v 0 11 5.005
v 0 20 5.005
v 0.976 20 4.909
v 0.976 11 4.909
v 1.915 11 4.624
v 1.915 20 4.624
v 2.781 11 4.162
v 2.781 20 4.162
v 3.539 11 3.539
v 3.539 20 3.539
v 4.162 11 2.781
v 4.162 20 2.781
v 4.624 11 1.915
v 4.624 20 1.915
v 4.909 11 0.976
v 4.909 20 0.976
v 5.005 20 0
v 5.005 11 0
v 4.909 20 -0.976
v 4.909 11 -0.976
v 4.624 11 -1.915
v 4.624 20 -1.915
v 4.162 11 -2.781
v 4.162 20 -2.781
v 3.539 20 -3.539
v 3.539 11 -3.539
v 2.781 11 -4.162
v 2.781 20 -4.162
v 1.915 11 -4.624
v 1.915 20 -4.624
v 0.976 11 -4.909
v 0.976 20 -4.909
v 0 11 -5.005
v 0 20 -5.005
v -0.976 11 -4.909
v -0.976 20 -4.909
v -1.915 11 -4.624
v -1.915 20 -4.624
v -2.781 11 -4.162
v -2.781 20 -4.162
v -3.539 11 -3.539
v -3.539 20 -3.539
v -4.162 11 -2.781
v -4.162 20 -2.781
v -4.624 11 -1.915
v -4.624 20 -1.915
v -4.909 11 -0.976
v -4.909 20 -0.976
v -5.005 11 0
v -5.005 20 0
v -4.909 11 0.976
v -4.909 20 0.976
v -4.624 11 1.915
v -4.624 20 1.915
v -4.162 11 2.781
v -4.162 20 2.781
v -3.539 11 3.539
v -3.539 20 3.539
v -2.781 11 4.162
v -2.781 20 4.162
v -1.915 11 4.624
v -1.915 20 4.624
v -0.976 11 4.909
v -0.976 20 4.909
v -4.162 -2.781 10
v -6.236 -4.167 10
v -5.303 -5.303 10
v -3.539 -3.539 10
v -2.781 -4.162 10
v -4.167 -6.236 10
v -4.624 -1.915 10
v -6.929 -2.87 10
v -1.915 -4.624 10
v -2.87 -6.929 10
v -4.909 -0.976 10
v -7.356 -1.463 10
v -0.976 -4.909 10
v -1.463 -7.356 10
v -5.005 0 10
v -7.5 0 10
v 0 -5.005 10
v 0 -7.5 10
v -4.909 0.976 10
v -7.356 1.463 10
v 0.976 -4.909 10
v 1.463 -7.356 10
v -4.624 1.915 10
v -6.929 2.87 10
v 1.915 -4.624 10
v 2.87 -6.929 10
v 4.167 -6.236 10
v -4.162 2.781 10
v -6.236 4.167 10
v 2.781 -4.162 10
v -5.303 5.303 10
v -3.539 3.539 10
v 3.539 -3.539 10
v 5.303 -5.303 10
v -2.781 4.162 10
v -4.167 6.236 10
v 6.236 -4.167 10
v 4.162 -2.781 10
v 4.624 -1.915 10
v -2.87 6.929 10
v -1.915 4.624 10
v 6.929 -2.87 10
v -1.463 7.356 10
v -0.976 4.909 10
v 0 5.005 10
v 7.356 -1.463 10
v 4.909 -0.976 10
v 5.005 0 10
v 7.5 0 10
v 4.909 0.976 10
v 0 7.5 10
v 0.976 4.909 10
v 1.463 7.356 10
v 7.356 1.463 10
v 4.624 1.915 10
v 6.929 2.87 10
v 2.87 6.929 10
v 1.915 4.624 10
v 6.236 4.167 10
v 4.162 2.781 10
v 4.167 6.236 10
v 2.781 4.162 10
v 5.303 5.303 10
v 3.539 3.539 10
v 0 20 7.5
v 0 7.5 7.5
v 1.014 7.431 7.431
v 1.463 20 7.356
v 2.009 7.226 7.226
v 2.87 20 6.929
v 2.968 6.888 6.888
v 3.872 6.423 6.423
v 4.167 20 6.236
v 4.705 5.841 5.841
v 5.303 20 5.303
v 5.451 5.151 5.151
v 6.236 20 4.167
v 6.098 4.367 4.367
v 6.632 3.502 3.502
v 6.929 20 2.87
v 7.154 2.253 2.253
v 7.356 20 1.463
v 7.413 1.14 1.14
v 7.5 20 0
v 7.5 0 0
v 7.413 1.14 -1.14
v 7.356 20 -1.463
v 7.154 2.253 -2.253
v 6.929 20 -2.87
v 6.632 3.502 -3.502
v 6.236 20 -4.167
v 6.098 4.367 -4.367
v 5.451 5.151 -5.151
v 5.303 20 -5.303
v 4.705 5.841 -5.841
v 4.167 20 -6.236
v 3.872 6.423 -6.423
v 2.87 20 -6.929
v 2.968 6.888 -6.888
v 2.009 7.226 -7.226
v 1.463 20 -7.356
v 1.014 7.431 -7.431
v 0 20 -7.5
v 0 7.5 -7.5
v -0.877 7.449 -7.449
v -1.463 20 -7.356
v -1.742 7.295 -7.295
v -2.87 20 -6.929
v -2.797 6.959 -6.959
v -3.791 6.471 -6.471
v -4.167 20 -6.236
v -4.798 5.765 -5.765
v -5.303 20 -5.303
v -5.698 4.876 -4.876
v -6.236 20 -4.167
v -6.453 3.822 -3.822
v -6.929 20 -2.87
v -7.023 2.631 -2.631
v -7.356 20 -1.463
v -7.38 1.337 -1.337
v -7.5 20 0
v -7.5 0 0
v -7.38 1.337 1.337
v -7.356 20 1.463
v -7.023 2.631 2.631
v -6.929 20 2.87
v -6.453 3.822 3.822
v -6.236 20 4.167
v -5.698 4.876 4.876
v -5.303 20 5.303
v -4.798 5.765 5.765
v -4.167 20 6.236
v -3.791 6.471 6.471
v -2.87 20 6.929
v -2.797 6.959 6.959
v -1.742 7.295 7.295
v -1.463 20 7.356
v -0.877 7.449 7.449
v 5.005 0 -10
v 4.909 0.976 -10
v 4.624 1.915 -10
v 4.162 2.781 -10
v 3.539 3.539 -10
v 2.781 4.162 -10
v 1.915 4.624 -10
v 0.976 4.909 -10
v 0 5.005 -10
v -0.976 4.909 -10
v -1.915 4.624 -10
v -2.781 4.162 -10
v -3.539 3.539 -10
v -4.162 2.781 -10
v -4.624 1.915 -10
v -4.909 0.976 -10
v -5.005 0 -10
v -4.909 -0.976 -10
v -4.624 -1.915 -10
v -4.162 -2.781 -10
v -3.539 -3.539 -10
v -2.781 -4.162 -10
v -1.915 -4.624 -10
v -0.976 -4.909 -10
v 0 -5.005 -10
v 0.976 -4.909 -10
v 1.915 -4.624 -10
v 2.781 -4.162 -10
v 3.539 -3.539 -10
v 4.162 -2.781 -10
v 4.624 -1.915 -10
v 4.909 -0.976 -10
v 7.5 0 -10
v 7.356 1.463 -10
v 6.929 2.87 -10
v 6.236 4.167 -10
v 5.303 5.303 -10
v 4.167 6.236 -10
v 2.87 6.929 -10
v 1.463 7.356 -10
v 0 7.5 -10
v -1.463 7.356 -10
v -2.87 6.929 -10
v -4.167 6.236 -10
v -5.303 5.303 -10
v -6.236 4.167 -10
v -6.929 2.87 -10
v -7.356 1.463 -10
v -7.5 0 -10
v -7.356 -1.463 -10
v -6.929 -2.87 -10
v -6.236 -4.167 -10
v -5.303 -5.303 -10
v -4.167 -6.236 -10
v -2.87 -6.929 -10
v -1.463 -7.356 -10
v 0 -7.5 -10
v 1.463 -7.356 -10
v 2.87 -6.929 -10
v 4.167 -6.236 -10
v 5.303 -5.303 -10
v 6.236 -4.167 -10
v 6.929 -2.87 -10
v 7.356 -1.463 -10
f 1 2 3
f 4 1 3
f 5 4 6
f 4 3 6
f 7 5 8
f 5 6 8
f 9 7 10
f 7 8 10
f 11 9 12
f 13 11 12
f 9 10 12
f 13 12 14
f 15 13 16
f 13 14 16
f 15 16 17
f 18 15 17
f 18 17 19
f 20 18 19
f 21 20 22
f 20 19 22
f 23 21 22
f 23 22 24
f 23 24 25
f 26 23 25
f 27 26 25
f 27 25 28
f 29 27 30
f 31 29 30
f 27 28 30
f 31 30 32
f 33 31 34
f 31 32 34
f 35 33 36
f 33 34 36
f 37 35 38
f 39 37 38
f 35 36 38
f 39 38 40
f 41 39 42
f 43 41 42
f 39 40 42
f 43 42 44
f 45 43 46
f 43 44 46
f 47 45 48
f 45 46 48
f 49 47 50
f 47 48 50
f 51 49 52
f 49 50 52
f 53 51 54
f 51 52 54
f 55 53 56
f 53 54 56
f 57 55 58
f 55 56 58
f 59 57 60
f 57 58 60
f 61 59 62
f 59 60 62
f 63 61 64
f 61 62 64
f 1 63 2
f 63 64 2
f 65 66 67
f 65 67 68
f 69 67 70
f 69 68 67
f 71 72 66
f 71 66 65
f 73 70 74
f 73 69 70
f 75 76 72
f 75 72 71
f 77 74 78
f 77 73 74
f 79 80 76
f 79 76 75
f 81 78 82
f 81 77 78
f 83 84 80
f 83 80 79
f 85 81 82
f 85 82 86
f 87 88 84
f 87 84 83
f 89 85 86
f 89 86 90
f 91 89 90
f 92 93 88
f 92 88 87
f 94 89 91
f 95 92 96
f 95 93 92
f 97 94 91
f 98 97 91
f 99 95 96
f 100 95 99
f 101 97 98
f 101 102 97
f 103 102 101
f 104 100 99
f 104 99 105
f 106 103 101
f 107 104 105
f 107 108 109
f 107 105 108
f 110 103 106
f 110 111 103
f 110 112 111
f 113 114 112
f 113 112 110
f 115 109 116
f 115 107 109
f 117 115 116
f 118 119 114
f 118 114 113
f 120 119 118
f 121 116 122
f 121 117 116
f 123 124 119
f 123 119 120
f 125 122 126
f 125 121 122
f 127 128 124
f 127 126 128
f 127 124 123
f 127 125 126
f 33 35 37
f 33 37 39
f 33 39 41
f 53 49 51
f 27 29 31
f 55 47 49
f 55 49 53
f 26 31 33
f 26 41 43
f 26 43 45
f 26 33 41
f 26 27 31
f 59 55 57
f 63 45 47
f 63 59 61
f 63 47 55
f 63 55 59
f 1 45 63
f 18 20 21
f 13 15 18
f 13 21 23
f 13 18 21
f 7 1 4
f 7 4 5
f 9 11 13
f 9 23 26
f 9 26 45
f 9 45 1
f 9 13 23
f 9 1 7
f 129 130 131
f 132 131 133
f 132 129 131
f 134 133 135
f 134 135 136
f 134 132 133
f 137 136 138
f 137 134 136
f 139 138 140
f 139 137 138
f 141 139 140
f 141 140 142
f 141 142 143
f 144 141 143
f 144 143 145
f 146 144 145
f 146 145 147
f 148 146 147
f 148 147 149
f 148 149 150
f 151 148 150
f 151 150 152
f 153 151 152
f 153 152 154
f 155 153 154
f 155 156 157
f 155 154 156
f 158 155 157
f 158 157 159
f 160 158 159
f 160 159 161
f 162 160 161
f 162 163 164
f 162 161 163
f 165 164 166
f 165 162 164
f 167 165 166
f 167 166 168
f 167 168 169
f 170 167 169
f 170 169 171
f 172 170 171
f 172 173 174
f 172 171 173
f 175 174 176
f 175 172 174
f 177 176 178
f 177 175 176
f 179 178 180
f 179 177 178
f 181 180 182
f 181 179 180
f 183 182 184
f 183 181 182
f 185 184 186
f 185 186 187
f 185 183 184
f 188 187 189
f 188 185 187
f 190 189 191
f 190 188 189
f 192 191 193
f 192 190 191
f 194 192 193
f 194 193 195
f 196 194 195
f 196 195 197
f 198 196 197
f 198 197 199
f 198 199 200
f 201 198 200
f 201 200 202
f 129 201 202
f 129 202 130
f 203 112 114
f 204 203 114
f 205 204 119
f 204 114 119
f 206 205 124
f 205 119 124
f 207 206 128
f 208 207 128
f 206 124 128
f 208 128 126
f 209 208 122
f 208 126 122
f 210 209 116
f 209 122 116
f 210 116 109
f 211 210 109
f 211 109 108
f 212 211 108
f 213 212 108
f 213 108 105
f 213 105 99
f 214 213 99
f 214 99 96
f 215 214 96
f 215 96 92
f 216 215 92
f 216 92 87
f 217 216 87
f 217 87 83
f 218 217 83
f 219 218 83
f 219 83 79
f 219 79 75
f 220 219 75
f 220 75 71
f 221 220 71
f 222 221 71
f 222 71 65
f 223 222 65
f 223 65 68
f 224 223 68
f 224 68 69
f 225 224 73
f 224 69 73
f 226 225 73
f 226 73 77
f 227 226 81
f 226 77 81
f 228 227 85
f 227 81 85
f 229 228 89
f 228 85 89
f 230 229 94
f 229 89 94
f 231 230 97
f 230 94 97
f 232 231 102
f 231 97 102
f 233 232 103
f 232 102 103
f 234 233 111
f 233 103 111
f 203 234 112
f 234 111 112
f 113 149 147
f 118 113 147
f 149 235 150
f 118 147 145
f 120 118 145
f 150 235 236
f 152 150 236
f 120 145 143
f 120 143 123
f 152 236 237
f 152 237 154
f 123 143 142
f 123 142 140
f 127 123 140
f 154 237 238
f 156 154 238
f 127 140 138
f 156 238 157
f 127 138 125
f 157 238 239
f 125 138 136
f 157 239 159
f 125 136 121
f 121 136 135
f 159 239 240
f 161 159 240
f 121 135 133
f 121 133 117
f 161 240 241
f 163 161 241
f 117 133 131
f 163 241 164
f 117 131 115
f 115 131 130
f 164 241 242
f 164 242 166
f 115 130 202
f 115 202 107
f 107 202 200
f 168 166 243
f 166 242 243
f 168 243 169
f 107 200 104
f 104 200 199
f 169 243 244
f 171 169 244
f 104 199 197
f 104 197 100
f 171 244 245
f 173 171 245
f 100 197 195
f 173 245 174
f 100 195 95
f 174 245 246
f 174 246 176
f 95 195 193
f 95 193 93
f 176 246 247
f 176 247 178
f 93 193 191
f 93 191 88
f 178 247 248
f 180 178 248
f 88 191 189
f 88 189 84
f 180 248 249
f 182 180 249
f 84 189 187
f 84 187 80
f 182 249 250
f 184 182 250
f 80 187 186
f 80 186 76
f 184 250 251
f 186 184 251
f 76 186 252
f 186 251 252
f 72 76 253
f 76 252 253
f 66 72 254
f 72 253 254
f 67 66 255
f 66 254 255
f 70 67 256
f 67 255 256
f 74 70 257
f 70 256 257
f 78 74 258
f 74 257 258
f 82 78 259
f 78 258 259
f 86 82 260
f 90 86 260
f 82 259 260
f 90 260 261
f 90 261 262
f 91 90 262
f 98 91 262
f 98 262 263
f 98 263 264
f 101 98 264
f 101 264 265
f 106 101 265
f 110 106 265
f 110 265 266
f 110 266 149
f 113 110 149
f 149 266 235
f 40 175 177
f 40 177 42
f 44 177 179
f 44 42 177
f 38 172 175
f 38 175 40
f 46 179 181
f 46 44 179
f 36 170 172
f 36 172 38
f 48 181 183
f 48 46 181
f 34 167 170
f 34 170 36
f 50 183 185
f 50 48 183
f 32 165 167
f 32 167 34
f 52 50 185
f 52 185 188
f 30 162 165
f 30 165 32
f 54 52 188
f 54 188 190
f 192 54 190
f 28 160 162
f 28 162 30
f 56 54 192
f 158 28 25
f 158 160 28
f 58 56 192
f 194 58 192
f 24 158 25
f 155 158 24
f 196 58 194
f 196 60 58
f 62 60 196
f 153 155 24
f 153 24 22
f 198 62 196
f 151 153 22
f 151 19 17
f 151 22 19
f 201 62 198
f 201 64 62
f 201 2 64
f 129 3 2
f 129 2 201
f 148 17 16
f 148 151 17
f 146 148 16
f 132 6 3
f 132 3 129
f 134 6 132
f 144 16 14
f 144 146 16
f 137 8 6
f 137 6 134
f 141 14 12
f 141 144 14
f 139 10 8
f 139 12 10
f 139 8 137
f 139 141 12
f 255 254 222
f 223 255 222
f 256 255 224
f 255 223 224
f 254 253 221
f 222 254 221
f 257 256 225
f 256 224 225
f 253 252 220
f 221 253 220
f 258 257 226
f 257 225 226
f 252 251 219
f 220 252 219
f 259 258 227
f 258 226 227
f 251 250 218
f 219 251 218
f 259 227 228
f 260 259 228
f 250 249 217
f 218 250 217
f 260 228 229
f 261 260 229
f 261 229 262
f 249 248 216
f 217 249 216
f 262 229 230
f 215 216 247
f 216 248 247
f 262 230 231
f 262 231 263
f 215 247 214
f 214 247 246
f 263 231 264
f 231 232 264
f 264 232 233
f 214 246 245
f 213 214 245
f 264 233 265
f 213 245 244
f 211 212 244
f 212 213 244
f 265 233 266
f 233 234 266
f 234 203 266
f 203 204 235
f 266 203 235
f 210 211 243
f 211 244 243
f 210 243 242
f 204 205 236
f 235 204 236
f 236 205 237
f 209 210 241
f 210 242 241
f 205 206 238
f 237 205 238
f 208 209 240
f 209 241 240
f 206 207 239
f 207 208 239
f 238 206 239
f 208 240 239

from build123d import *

# Parameters (mm, degrees)
BOSS_EXTRUDE1_DEPTH      = 10
BOSS_EXTRUDE1_DEPTH_BACK = 10
SKETCH1_R                = 7.5
SKETCH3_R                = 7.5
BOSS_EXTRUDE2_DEPTH      = 20
SKETCH4_R                = 5.005
CUT_EXTRUDE2_DEPTH       = 23
SKETCH5_R                = 5.005
CUT_EXTRUDE3_DEPTH       = 9


with BuildPart() as part:
    # Sketch1 → Boss-Extrude1 (new, two sides: drawn at the far end of the back side and taken through both)
    with BuildSketch(Plane.XY.offset(-BOSS_EXTRUDE1_DEPTH_BACK)):
        Circle(SKETCH1_R)
    extrude(amount=BOSS_EXTRUDE1_DEPTH + BOSS_EXTRUDE1_DEPTH_BACK)

    # Sketch3 → Boss-Extrude2 (add)
    with BuildSketch(Plane(origin=(0, 20, 0), x_dir=(1, 0, 0), z_dir=(0, 1, 0))):
        Circle(SKETCH3_R)
    extrude(amount=-BOSS_EXTRUDE2_DEPTH)

    # Sketch4 → Cut-Extrude2 (cut)
    with BuildSketch(Plane.XY.offset(10)):
        Circle(SKETCH4_R)
    extrude(amount=-CUT_EXTRUDE2_DEPTH, mode=Mode.SUBTRACT)

    # Sketch5 → Cut-Extrude3 (cut)
    with BuildSketch(Plane(origin=(0, 20, 0), x_dir=(1, 0, 0), z_dir=(0, 1, 0))):
        Circle(SKETCH5_R)
    extrude(amount=-CUT_EXTRUDE3_DEPTH, mode=Mode.SUBTRACT)


solid = part.part
